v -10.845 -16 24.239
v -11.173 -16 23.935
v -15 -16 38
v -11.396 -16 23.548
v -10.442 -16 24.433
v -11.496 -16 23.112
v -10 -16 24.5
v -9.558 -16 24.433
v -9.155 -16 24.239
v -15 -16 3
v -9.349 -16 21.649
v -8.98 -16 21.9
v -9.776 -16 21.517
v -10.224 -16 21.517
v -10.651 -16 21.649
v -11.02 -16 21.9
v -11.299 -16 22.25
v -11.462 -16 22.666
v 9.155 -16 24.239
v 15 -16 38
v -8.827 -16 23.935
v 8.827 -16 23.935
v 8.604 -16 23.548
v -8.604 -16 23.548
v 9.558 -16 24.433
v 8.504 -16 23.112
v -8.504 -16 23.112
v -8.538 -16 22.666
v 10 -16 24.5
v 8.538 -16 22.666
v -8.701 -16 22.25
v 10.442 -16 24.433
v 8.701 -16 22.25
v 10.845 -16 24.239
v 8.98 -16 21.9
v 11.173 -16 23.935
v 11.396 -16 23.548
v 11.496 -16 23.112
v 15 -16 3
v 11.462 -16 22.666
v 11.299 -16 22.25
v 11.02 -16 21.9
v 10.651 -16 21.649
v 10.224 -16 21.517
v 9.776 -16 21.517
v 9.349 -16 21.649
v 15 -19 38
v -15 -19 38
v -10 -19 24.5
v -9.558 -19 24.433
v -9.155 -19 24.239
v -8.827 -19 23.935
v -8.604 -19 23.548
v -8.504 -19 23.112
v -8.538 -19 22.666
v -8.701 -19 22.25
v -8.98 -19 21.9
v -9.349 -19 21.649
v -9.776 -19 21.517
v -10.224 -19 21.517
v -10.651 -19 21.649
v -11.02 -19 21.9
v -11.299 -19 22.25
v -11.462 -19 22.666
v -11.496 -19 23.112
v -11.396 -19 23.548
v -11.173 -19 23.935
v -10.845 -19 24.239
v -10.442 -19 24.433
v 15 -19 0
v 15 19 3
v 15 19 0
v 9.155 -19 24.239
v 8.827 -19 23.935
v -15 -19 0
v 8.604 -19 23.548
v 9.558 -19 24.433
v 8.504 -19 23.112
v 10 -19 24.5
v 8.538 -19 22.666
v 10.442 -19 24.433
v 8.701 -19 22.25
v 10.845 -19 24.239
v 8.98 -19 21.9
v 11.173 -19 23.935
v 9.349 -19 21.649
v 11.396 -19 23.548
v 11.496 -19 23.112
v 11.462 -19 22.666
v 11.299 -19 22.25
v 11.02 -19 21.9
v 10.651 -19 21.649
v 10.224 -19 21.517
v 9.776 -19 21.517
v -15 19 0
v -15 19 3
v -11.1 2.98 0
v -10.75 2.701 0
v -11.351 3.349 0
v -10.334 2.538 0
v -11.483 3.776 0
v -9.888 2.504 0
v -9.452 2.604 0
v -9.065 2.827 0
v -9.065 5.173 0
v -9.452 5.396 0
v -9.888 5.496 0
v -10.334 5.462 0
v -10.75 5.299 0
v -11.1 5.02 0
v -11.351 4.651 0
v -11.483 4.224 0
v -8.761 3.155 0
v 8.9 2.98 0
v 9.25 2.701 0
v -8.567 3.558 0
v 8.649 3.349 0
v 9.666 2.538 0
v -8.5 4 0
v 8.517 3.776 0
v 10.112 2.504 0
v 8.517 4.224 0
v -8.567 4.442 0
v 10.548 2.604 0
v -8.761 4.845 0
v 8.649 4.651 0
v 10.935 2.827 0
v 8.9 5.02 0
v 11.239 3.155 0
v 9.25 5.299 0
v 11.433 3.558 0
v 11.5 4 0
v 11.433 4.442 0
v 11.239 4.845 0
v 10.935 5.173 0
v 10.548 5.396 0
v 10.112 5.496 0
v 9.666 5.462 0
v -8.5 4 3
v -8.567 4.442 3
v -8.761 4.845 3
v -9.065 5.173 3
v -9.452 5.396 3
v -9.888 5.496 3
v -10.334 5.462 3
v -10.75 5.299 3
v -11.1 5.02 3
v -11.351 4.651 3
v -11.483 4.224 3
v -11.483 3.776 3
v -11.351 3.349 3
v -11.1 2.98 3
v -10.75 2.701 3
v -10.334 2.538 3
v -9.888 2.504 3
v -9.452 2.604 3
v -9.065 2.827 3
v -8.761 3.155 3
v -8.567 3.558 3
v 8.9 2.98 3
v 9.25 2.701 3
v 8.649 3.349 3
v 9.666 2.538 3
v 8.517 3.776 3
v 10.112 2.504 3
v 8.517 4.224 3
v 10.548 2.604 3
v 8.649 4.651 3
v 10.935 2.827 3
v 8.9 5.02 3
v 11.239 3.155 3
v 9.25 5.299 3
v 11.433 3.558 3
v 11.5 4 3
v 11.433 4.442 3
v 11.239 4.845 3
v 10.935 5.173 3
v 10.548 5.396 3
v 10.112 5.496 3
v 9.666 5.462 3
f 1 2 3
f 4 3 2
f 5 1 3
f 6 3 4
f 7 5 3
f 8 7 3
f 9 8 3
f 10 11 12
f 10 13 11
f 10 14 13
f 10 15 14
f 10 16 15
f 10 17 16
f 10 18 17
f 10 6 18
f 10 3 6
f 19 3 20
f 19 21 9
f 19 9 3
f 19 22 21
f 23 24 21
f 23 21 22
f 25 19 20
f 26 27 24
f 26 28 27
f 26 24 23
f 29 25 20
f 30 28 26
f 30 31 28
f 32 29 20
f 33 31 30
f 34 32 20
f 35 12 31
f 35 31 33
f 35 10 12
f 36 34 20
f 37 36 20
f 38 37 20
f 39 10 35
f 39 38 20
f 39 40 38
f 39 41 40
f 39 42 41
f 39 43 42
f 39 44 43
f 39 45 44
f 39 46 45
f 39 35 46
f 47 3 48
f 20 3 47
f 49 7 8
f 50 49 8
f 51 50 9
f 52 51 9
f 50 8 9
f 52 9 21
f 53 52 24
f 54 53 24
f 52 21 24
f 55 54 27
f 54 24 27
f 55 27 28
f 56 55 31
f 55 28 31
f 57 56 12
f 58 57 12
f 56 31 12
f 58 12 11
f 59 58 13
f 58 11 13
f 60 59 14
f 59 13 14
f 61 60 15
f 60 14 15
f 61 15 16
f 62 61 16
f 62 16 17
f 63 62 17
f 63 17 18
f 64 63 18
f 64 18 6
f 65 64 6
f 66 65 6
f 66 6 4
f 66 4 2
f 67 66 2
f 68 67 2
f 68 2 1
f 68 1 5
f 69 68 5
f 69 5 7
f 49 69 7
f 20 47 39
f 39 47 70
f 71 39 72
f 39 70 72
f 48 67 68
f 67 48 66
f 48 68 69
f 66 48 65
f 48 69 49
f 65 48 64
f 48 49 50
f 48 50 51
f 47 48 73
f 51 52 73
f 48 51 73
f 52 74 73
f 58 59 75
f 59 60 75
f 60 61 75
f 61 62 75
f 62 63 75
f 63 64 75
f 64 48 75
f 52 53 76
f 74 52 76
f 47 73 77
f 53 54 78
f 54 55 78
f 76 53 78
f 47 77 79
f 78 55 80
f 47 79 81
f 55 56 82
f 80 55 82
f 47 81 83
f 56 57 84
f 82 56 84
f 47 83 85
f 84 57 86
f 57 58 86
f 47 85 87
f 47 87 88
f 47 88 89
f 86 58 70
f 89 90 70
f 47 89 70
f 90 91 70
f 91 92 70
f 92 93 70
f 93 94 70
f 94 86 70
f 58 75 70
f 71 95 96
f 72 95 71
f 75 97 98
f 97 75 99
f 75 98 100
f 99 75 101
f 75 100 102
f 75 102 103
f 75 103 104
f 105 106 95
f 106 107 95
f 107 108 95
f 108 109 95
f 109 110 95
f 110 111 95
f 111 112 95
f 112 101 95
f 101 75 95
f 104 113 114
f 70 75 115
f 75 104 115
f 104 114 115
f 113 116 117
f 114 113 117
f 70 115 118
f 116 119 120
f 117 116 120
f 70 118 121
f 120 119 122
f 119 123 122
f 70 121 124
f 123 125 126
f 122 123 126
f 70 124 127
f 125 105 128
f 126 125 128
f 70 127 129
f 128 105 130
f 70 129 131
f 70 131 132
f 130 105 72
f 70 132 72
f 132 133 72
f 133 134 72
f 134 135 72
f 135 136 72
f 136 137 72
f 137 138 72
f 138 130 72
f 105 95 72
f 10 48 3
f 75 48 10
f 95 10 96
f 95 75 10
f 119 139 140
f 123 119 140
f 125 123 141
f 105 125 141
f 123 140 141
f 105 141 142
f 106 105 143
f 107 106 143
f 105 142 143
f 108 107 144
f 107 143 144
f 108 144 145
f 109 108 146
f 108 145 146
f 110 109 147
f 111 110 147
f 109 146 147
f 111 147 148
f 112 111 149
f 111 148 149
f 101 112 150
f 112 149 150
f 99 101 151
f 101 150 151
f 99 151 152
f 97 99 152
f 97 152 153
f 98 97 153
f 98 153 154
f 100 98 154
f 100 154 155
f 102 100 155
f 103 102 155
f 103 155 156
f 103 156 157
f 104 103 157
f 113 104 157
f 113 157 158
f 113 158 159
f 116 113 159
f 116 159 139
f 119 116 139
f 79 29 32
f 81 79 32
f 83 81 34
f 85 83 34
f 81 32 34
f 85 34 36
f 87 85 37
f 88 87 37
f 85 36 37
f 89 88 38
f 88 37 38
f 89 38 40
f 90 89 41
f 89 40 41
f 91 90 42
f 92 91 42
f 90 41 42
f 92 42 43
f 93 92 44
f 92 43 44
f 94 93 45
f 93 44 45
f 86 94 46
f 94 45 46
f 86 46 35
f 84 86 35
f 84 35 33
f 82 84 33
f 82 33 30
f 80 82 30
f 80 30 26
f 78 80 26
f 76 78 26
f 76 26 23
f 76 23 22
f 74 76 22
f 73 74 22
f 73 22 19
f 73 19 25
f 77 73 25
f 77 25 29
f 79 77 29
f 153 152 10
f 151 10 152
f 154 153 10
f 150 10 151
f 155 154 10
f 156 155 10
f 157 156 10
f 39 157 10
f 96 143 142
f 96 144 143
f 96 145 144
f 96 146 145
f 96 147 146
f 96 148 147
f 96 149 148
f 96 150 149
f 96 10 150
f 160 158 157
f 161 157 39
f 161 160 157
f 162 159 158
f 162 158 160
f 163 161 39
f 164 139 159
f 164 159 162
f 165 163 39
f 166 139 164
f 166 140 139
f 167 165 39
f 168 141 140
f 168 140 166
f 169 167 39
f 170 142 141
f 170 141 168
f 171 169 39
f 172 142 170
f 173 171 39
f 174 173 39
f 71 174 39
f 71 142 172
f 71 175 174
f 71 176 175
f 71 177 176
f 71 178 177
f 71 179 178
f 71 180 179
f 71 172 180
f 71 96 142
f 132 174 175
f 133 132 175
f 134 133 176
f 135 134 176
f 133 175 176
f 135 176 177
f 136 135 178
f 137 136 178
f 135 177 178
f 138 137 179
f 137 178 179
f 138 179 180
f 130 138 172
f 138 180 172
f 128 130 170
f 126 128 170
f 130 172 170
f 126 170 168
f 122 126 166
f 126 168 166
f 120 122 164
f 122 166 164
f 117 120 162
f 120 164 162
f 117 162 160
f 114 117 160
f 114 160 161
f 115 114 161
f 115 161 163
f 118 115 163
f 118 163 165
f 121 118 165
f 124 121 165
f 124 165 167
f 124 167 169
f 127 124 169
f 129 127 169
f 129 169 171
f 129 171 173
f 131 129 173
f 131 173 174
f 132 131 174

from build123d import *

# Parameters (mm, degrees)
SKETCH_1_W          = 30
SKETCH_1_H          = 38
EXTRUDE_1_DEPTH     = 3
SKETCH_2_W          = 30
SKETCH_2_H          = 3
EXTRUDE_2_DEPTH     = 35
SKETCH_3_R          = 1.5
CUT_EXTRUDE_1_DEPTH = 35
SKETCH_4_R          = 1.5
CUT_EXTRUDE_2_DEPTH = 35


with BuildPart() as part:
    # 草图1 → 凸台-拉伸1 (new body)
    with BuildSketch(Plane.XY):
        Rectangle(SKETCH_1_W, SKETCH_1_H)
    extrude(amount=EXTRUDE_1_DEPTH)

    # 草图2 → 凸台-拉伸2 (add)
    with BuildSketch(Plane.XY.offset(3)):
        with Locations((0, -17.5)):
            Rectangle(SKETCH_2_W, SKETCH_2_H)
    extrude(amount=EXTRUDE_2_DEPTH)

    # 草图3 → 切除-拉伸1 (cut)
    with BuildSketch(Plane.XY.offset(3)):
        with Locations((-10, 4)):
            Circle(SKETCH_3_R)
        with Locations((10, 4)):
            Circle(SKETCH_3_R)
    extrude(amount=-CUT_EXTRUDE_1_DEPTH, mode=Mode.SUBTRACT)

    # 草图4 → 切除-拉伸2 (cut)
    with BuildSketch(Plane(origin=(0, -16, 0), x_dir=(1, 0, 0), z_dir=(0, 1, 0))):
        with Locations(Location((-10, -23, 0), (0, 0, 270))):
            Circle(SKETCH_4_R)
        with Locations(Location((10, -23, 0), (0, 0, 270))):
            Circle(SKETCH_4_R)
    extrude(amount=-CUT_EXTRUDE_2_DEPTH, mode=Mode.SUBTRACT)


solid = part.part
